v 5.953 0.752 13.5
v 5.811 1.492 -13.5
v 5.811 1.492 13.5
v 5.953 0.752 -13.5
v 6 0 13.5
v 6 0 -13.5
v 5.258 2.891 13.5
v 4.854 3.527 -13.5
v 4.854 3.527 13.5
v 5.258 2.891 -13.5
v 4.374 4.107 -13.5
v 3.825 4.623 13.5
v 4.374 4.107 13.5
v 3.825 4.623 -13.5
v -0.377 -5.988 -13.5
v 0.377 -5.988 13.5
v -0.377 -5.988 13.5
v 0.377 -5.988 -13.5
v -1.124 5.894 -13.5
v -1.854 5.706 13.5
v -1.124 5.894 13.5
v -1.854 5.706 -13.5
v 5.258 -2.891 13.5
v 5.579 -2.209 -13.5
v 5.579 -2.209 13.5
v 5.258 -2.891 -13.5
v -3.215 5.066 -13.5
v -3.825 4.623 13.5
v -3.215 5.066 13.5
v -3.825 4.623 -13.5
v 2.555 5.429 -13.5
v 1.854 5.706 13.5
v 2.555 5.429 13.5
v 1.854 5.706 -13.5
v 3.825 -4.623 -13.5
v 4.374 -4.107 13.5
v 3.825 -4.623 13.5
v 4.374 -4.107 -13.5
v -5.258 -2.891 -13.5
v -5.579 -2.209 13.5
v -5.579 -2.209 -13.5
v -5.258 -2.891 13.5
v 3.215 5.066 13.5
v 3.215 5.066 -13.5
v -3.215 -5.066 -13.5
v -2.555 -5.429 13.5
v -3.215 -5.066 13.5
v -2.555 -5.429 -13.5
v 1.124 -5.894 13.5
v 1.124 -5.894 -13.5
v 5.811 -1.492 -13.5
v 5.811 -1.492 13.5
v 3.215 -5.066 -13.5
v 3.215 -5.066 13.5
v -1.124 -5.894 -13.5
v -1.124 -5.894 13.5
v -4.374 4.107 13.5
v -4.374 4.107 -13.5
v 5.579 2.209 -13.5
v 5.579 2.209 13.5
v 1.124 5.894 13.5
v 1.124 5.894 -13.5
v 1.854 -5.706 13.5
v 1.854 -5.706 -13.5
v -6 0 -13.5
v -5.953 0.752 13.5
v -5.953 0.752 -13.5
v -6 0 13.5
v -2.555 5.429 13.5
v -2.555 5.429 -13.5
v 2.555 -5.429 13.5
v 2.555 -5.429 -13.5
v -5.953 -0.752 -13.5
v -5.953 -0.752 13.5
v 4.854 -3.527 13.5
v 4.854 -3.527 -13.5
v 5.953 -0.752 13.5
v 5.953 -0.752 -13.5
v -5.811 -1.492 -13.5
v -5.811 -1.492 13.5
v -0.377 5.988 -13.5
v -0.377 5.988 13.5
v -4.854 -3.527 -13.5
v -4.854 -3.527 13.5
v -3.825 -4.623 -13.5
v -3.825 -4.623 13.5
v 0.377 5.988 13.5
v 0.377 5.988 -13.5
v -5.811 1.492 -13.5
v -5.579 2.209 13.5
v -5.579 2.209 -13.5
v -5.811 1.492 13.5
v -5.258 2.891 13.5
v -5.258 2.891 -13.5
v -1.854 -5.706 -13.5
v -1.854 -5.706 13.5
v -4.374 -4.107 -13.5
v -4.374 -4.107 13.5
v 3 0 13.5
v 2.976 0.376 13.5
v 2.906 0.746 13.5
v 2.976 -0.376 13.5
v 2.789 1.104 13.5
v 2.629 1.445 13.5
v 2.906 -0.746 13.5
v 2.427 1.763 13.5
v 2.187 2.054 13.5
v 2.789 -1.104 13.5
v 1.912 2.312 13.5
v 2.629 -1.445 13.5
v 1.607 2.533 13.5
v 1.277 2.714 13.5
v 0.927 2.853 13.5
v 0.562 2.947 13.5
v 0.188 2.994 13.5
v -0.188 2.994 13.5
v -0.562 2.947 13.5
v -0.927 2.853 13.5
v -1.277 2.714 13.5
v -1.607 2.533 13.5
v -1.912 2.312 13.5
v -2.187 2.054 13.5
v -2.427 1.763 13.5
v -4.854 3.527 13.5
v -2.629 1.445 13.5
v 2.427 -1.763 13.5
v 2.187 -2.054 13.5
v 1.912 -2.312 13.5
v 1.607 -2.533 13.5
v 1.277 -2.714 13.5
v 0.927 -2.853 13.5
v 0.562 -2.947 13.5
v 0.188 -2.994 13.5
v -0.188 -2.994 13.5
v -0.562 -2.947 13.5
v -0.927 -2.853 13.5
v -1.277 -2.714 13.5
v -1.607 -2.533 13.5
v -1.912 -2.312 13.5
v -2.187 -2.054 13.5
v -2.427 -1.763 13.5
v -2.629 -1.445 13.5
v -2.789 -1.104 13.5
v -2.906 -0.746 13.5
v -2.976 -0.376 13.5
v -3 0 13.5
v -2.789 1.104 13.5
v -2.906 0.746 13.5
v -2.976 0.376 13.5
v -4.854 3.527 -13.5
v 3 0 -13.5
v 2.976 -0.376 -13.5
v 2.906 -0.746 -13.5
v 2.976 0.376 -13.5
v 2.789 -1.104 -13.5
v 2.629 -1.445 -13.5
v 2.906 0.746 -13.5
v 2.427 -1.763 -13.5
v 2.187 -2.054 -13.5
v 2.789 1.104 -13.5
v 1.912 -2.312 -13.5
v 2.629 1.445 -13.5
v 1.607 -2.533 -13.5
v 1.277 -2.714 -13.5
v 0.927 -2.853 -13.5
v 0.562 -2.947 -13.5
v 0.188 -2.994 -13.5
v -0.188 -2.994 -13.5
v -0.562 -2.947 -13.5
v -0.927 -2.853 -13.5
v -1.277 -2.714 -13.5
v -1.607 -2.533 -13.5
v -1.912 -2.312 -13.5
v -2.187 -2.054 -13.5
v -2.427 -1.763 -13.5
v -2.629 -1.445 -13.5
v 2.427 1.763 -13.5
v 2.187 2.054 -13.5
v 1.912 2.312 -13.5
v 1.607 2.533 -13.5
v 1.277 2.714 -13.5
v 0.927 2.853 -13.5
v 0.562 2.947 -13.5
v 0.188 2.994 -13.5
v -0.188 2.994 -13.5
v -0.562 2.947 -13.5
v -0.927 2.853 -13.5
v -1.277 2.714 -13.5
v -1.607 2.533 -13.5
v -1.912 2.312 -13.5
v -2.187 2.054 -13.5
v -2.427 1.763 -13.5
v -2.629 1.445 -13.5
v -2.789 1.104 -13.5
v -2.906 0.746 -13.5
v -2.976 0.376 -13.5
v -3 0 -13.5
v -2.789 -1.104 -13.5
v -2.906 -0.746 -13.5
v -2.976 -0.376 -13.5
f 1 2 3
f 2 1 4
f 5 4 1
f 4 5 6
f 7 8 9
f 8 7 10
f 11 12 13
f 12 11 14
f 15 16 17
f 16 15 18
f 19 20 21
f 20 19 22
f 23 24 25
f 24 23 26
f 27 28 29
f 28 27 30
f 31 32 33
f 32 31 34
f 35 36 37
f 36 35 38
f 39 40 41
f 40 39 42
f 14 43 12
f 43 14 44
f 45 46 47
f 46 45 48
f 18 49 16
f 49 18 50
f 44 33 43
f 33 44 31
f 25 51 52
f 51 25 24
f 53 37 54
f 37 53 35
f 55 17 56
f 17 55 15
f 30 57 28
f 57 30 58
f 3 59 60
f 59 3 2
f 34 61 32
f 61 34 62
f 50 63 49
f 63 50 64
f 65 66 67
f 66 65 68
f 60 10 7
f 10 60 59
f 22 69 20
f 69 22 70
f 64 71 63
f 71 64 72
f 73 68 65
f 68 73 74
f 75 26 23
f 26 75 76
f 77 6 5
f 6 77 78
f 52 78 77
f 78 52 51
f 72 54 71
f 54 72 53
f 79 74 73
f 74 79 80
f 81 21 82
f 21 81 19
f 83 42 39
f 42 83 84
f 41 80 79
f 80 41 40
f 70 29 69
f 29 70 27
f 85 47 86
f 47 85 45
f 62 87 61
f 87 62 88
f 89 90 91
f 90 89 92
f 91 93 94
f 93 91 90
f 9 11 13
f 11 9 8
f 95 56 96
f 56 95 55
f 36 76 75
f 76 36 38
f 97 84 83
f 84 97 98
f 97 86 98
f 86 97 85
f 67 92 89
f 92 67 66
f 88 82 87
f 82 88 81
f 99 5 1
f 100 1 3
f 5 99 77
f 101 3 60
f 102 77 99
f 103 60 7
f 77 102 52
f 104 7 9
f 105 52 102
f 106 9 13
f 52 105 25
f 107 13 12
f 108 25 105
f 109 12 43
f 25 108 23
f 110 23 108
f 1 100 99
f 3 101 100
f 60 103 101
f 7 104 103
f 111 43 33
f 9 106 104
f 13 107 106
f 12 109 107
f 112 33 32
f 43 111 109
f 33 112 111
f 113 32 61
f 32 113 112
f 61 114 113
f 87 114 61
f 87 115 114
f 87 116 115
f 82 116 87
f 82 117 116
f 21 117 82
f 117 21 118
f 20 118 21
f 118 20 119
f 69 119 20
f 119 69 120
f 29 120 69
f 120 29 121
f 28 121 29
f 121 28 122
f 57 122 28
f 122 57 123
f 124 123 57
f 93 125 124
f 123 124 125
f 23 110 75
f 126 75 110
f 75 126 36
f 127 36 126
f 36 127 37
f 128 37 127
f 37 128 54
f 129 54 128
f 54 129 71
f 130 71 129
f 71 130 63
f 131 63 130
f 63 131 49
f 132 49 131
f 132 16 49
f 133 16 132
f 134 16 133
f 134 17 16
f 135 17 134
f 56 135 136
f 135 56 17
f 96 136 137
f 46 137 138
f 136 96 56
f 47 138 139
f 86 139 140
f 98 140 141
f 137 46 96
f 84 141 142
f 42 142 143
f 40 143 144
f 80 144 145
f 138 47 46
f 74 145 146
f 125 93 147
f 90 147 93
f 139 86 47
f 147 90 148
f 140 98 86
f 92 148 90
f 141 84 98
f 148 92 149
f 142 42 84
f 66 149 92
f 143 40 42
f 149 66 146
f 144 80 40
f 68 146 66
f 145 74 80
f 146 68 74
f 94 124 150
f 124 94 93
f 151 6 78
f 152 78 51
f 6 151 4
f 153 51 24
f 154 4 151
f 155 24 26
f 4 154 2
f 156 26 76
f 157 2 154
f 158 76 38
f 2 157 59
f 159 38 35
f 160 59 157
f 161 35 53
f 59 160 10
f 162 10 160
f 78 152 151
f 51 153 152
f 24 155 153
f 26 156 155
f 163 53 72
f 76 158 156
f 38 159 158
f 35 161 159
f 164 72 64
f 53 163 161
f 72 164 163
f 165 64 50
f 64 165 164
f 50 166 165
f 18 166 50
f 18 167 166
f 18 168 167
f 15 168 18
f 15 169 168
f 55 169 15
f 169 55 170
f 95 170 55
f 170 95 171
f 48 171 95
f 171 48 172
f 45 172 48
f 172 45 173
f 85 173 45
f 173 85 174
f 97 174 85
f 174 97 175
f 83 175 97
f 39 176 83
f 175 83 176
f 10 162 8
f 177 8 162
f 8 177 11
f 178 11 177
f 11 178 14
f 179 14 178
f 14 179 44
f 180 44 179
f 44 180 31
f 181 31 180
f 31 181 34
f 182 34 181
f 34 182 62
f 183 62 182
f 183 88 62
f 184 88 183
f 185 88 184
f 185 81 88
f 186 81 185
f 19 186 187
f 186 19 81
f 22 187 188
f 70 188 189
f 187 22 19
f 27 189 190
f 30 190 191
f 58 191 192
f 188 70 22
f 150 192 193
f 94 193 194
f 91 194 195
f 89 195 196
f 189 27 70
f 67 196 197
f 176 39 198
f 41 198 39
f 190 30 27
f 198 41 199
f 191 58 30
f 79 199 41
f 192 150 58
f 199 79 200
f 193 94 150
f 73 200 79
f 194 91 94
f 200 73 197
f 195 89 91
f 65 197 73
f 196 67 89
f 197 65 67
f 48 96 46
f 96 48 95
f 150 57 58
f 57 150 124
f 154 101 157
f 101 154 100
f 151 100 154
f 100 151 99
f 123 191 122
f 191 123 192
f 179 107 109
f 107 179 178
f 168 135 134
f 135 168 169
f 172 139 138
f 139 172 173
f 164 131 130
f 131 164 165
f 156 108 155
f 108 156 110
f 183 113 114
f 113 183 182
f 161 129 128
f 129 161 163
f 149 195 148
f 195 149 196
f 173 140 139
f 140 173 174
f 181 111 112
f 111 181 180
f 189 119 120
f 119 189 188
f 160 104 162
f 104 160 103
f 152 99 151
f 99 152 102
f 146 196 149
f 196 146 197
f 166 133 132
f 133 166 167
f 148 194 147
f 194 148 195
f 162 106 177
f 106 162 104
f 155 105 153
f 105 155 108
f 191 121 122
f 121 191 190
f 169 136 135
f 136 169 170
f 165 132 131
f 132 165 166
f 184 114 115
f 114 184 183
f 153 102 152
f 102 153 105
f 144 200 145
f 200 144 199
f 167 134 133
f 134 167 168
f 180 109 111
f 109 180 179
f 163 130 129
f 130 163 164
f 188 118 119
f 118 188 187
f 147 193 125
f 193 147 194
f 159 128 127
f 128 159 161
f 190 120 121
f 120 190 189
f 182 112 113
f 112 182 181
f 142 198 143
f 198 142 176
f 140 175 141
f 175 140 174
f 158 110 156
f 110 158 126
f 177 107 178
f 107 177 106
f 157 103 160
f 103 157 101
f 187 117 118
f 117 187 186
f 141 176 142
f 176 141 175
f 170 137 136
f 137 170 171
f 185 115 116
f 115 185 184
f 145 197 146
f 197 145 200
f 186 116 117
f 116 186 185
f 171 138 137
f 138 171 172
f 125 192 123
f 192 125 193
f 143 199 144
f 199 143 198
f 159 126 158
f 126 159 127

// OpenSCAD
$fn = 50;


difference() {
	union() {
		translate(v = [0, 0, -13.5000000000]) {
			cylinder(h = 27, r = 6.0000000000);
		}
	}
	union() {
		translate(v = [0, 0, -100.0000000000]) {
			cylinder(h = 200, r = 3.0000000000);
		}
	}
}
